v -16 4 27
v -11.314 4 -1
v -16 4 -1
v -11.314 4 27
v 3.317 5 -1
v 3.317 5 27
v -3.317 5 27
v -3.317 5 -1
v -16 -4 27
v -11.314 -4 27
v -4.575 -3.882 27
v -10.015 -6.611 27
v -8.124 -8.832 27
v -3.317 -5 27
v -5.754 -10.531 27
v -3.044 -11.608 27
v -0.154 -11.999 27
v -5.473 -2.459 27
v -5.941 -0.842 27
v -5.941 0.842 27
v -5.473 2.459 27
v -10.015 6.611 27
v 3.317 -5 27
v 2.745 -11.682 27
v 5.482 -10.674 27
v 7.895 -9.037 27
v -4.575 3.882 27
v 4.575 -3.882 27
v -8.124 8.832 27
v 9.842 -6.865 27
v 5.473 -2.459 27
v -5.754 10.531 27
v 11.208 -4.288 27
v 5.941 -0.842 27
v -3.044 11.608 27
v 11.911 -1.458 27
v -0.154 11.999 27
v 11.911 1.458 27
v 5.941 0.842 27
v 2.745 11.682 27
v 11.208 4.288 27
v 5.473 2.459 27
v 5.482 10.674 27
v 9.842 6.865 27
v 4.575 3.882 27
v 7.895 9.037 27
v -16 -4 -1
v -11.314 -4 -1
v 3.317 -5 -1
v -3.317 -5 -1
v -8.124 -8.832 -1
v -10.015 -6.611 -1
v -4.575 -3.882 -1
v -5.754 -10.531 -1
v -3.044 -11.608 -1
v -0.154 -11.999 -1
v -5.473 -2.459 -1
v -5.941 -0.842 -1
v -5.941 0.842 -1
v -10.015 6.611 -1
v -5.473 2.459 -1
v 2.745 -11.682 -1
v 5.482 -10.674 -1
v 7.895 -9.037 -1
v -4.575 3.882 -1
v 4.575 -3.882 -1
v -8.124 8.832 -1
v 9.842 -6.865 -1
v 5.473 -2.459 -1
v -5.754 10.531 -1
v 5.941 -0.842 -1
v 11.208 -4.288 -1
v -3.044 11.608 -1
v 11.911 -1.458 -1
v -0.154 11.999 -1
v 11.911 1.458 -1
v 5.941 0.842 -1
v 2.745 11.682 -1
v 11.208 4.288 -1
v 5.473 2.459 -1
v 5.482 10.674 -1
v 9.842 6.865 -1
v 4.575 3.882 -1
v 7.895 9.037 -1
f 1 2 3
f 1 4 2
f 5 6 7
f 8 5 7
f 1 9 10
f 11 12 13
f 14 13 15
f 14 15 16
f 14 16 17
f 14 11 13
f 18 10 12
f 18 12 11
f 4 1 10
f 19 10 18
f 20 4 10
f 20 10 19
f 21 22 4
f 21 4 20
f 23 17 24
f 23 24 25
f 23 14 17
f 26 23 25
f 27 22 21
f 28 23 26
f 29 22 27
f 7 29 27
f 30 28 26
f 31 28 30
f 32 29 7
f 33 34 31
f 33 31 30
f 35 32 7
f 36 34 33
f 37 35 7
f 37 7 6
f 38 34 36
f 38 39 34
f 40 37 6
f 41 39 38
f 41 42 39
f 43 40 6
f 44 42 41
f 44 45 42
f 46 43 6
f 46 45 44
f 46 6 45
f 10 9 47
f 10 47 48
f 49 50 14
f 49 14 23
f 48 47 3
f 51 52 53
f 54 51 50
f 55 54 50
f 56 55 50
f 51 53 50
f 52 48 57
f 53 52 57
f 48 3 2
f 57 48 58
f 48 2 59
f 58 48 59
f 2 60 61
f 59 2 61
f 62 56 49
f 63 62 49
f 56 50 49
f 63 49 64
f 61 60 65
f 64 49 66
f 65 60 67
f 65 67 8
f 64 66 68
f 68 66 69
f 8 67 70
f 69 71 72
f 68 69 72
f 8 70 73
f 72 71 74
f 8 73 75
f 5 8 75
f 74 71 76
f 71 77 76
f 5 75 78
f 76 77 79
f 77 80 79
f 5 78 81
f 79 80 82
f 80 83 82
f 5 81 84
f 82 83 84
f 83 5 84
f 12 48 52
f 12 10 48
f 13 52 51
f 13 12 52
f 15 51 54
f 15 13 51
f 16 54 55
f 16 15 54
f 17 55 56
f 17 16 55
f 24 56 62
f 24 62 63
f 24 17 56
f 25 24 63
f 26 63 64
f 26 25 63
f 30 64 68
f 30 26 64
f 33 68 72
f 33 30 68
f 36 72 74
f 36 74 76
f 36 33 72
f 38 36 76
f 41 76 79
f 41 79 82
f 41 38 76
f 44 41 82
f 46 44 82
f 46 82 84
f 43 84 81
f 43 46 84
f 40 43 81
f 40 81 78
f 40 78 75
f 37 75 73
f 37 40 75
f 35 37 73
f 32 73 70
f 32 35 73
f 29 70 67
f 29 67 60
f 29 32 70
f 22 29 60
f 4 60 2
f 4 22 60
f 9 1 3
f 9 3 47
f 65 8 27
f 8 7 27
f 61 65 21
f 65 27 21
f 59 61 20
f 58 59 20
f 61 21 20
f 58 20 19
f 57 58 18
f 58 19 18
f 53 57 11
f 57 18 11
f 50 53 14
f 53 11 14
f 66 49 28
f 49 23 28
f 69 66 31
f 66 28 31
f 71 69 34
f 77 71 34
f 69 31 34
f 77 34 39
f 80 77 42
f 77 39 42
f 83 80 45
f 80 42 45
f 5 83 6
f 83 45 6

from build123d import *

# Parameters (mm, degrees)
EXTRUDE_1_DEPTH      = 27
EXTRUDE_1_DEPTH_BACK = 1


with BuildPart() as part:
    # Эскиз1 → Бобышка-Вытянуть1 (new body, two sides)
    with BuildSketch(Plane.XY) as extrude_1_sk:
        with BuildLine():
            Line((-11.313708499, 4), (-16, 4))
            Line((-16, 4), (-16, -4))
            Line((-16, -4), (-11.313708499, -4))
            ThreePointArc((-11.313708499, -4), (12, 0), (-11.313708499, 4))
        make_face()
        with BuildLine():
            Line((3.31662479, 5), (-3.31662479, 5))
            ThreePointArc((-3.31662479, 5), (-6, 0), (-3.31662479, -5))
            Line((-3.31662479, -5), (3.31662479, -5))
            ThreePointArc((3.31662479, -5), (6, 0), (3.31662479, 5))
        make_face(mode=Mode.SUBTRACT)
    extrude(amount=EXTRUDE_1_DEPTH)
    extrude(extrude_1_sk.sketch, amount=-EXTRUDE_1_DEPTH_BACK)


solid = part.part
